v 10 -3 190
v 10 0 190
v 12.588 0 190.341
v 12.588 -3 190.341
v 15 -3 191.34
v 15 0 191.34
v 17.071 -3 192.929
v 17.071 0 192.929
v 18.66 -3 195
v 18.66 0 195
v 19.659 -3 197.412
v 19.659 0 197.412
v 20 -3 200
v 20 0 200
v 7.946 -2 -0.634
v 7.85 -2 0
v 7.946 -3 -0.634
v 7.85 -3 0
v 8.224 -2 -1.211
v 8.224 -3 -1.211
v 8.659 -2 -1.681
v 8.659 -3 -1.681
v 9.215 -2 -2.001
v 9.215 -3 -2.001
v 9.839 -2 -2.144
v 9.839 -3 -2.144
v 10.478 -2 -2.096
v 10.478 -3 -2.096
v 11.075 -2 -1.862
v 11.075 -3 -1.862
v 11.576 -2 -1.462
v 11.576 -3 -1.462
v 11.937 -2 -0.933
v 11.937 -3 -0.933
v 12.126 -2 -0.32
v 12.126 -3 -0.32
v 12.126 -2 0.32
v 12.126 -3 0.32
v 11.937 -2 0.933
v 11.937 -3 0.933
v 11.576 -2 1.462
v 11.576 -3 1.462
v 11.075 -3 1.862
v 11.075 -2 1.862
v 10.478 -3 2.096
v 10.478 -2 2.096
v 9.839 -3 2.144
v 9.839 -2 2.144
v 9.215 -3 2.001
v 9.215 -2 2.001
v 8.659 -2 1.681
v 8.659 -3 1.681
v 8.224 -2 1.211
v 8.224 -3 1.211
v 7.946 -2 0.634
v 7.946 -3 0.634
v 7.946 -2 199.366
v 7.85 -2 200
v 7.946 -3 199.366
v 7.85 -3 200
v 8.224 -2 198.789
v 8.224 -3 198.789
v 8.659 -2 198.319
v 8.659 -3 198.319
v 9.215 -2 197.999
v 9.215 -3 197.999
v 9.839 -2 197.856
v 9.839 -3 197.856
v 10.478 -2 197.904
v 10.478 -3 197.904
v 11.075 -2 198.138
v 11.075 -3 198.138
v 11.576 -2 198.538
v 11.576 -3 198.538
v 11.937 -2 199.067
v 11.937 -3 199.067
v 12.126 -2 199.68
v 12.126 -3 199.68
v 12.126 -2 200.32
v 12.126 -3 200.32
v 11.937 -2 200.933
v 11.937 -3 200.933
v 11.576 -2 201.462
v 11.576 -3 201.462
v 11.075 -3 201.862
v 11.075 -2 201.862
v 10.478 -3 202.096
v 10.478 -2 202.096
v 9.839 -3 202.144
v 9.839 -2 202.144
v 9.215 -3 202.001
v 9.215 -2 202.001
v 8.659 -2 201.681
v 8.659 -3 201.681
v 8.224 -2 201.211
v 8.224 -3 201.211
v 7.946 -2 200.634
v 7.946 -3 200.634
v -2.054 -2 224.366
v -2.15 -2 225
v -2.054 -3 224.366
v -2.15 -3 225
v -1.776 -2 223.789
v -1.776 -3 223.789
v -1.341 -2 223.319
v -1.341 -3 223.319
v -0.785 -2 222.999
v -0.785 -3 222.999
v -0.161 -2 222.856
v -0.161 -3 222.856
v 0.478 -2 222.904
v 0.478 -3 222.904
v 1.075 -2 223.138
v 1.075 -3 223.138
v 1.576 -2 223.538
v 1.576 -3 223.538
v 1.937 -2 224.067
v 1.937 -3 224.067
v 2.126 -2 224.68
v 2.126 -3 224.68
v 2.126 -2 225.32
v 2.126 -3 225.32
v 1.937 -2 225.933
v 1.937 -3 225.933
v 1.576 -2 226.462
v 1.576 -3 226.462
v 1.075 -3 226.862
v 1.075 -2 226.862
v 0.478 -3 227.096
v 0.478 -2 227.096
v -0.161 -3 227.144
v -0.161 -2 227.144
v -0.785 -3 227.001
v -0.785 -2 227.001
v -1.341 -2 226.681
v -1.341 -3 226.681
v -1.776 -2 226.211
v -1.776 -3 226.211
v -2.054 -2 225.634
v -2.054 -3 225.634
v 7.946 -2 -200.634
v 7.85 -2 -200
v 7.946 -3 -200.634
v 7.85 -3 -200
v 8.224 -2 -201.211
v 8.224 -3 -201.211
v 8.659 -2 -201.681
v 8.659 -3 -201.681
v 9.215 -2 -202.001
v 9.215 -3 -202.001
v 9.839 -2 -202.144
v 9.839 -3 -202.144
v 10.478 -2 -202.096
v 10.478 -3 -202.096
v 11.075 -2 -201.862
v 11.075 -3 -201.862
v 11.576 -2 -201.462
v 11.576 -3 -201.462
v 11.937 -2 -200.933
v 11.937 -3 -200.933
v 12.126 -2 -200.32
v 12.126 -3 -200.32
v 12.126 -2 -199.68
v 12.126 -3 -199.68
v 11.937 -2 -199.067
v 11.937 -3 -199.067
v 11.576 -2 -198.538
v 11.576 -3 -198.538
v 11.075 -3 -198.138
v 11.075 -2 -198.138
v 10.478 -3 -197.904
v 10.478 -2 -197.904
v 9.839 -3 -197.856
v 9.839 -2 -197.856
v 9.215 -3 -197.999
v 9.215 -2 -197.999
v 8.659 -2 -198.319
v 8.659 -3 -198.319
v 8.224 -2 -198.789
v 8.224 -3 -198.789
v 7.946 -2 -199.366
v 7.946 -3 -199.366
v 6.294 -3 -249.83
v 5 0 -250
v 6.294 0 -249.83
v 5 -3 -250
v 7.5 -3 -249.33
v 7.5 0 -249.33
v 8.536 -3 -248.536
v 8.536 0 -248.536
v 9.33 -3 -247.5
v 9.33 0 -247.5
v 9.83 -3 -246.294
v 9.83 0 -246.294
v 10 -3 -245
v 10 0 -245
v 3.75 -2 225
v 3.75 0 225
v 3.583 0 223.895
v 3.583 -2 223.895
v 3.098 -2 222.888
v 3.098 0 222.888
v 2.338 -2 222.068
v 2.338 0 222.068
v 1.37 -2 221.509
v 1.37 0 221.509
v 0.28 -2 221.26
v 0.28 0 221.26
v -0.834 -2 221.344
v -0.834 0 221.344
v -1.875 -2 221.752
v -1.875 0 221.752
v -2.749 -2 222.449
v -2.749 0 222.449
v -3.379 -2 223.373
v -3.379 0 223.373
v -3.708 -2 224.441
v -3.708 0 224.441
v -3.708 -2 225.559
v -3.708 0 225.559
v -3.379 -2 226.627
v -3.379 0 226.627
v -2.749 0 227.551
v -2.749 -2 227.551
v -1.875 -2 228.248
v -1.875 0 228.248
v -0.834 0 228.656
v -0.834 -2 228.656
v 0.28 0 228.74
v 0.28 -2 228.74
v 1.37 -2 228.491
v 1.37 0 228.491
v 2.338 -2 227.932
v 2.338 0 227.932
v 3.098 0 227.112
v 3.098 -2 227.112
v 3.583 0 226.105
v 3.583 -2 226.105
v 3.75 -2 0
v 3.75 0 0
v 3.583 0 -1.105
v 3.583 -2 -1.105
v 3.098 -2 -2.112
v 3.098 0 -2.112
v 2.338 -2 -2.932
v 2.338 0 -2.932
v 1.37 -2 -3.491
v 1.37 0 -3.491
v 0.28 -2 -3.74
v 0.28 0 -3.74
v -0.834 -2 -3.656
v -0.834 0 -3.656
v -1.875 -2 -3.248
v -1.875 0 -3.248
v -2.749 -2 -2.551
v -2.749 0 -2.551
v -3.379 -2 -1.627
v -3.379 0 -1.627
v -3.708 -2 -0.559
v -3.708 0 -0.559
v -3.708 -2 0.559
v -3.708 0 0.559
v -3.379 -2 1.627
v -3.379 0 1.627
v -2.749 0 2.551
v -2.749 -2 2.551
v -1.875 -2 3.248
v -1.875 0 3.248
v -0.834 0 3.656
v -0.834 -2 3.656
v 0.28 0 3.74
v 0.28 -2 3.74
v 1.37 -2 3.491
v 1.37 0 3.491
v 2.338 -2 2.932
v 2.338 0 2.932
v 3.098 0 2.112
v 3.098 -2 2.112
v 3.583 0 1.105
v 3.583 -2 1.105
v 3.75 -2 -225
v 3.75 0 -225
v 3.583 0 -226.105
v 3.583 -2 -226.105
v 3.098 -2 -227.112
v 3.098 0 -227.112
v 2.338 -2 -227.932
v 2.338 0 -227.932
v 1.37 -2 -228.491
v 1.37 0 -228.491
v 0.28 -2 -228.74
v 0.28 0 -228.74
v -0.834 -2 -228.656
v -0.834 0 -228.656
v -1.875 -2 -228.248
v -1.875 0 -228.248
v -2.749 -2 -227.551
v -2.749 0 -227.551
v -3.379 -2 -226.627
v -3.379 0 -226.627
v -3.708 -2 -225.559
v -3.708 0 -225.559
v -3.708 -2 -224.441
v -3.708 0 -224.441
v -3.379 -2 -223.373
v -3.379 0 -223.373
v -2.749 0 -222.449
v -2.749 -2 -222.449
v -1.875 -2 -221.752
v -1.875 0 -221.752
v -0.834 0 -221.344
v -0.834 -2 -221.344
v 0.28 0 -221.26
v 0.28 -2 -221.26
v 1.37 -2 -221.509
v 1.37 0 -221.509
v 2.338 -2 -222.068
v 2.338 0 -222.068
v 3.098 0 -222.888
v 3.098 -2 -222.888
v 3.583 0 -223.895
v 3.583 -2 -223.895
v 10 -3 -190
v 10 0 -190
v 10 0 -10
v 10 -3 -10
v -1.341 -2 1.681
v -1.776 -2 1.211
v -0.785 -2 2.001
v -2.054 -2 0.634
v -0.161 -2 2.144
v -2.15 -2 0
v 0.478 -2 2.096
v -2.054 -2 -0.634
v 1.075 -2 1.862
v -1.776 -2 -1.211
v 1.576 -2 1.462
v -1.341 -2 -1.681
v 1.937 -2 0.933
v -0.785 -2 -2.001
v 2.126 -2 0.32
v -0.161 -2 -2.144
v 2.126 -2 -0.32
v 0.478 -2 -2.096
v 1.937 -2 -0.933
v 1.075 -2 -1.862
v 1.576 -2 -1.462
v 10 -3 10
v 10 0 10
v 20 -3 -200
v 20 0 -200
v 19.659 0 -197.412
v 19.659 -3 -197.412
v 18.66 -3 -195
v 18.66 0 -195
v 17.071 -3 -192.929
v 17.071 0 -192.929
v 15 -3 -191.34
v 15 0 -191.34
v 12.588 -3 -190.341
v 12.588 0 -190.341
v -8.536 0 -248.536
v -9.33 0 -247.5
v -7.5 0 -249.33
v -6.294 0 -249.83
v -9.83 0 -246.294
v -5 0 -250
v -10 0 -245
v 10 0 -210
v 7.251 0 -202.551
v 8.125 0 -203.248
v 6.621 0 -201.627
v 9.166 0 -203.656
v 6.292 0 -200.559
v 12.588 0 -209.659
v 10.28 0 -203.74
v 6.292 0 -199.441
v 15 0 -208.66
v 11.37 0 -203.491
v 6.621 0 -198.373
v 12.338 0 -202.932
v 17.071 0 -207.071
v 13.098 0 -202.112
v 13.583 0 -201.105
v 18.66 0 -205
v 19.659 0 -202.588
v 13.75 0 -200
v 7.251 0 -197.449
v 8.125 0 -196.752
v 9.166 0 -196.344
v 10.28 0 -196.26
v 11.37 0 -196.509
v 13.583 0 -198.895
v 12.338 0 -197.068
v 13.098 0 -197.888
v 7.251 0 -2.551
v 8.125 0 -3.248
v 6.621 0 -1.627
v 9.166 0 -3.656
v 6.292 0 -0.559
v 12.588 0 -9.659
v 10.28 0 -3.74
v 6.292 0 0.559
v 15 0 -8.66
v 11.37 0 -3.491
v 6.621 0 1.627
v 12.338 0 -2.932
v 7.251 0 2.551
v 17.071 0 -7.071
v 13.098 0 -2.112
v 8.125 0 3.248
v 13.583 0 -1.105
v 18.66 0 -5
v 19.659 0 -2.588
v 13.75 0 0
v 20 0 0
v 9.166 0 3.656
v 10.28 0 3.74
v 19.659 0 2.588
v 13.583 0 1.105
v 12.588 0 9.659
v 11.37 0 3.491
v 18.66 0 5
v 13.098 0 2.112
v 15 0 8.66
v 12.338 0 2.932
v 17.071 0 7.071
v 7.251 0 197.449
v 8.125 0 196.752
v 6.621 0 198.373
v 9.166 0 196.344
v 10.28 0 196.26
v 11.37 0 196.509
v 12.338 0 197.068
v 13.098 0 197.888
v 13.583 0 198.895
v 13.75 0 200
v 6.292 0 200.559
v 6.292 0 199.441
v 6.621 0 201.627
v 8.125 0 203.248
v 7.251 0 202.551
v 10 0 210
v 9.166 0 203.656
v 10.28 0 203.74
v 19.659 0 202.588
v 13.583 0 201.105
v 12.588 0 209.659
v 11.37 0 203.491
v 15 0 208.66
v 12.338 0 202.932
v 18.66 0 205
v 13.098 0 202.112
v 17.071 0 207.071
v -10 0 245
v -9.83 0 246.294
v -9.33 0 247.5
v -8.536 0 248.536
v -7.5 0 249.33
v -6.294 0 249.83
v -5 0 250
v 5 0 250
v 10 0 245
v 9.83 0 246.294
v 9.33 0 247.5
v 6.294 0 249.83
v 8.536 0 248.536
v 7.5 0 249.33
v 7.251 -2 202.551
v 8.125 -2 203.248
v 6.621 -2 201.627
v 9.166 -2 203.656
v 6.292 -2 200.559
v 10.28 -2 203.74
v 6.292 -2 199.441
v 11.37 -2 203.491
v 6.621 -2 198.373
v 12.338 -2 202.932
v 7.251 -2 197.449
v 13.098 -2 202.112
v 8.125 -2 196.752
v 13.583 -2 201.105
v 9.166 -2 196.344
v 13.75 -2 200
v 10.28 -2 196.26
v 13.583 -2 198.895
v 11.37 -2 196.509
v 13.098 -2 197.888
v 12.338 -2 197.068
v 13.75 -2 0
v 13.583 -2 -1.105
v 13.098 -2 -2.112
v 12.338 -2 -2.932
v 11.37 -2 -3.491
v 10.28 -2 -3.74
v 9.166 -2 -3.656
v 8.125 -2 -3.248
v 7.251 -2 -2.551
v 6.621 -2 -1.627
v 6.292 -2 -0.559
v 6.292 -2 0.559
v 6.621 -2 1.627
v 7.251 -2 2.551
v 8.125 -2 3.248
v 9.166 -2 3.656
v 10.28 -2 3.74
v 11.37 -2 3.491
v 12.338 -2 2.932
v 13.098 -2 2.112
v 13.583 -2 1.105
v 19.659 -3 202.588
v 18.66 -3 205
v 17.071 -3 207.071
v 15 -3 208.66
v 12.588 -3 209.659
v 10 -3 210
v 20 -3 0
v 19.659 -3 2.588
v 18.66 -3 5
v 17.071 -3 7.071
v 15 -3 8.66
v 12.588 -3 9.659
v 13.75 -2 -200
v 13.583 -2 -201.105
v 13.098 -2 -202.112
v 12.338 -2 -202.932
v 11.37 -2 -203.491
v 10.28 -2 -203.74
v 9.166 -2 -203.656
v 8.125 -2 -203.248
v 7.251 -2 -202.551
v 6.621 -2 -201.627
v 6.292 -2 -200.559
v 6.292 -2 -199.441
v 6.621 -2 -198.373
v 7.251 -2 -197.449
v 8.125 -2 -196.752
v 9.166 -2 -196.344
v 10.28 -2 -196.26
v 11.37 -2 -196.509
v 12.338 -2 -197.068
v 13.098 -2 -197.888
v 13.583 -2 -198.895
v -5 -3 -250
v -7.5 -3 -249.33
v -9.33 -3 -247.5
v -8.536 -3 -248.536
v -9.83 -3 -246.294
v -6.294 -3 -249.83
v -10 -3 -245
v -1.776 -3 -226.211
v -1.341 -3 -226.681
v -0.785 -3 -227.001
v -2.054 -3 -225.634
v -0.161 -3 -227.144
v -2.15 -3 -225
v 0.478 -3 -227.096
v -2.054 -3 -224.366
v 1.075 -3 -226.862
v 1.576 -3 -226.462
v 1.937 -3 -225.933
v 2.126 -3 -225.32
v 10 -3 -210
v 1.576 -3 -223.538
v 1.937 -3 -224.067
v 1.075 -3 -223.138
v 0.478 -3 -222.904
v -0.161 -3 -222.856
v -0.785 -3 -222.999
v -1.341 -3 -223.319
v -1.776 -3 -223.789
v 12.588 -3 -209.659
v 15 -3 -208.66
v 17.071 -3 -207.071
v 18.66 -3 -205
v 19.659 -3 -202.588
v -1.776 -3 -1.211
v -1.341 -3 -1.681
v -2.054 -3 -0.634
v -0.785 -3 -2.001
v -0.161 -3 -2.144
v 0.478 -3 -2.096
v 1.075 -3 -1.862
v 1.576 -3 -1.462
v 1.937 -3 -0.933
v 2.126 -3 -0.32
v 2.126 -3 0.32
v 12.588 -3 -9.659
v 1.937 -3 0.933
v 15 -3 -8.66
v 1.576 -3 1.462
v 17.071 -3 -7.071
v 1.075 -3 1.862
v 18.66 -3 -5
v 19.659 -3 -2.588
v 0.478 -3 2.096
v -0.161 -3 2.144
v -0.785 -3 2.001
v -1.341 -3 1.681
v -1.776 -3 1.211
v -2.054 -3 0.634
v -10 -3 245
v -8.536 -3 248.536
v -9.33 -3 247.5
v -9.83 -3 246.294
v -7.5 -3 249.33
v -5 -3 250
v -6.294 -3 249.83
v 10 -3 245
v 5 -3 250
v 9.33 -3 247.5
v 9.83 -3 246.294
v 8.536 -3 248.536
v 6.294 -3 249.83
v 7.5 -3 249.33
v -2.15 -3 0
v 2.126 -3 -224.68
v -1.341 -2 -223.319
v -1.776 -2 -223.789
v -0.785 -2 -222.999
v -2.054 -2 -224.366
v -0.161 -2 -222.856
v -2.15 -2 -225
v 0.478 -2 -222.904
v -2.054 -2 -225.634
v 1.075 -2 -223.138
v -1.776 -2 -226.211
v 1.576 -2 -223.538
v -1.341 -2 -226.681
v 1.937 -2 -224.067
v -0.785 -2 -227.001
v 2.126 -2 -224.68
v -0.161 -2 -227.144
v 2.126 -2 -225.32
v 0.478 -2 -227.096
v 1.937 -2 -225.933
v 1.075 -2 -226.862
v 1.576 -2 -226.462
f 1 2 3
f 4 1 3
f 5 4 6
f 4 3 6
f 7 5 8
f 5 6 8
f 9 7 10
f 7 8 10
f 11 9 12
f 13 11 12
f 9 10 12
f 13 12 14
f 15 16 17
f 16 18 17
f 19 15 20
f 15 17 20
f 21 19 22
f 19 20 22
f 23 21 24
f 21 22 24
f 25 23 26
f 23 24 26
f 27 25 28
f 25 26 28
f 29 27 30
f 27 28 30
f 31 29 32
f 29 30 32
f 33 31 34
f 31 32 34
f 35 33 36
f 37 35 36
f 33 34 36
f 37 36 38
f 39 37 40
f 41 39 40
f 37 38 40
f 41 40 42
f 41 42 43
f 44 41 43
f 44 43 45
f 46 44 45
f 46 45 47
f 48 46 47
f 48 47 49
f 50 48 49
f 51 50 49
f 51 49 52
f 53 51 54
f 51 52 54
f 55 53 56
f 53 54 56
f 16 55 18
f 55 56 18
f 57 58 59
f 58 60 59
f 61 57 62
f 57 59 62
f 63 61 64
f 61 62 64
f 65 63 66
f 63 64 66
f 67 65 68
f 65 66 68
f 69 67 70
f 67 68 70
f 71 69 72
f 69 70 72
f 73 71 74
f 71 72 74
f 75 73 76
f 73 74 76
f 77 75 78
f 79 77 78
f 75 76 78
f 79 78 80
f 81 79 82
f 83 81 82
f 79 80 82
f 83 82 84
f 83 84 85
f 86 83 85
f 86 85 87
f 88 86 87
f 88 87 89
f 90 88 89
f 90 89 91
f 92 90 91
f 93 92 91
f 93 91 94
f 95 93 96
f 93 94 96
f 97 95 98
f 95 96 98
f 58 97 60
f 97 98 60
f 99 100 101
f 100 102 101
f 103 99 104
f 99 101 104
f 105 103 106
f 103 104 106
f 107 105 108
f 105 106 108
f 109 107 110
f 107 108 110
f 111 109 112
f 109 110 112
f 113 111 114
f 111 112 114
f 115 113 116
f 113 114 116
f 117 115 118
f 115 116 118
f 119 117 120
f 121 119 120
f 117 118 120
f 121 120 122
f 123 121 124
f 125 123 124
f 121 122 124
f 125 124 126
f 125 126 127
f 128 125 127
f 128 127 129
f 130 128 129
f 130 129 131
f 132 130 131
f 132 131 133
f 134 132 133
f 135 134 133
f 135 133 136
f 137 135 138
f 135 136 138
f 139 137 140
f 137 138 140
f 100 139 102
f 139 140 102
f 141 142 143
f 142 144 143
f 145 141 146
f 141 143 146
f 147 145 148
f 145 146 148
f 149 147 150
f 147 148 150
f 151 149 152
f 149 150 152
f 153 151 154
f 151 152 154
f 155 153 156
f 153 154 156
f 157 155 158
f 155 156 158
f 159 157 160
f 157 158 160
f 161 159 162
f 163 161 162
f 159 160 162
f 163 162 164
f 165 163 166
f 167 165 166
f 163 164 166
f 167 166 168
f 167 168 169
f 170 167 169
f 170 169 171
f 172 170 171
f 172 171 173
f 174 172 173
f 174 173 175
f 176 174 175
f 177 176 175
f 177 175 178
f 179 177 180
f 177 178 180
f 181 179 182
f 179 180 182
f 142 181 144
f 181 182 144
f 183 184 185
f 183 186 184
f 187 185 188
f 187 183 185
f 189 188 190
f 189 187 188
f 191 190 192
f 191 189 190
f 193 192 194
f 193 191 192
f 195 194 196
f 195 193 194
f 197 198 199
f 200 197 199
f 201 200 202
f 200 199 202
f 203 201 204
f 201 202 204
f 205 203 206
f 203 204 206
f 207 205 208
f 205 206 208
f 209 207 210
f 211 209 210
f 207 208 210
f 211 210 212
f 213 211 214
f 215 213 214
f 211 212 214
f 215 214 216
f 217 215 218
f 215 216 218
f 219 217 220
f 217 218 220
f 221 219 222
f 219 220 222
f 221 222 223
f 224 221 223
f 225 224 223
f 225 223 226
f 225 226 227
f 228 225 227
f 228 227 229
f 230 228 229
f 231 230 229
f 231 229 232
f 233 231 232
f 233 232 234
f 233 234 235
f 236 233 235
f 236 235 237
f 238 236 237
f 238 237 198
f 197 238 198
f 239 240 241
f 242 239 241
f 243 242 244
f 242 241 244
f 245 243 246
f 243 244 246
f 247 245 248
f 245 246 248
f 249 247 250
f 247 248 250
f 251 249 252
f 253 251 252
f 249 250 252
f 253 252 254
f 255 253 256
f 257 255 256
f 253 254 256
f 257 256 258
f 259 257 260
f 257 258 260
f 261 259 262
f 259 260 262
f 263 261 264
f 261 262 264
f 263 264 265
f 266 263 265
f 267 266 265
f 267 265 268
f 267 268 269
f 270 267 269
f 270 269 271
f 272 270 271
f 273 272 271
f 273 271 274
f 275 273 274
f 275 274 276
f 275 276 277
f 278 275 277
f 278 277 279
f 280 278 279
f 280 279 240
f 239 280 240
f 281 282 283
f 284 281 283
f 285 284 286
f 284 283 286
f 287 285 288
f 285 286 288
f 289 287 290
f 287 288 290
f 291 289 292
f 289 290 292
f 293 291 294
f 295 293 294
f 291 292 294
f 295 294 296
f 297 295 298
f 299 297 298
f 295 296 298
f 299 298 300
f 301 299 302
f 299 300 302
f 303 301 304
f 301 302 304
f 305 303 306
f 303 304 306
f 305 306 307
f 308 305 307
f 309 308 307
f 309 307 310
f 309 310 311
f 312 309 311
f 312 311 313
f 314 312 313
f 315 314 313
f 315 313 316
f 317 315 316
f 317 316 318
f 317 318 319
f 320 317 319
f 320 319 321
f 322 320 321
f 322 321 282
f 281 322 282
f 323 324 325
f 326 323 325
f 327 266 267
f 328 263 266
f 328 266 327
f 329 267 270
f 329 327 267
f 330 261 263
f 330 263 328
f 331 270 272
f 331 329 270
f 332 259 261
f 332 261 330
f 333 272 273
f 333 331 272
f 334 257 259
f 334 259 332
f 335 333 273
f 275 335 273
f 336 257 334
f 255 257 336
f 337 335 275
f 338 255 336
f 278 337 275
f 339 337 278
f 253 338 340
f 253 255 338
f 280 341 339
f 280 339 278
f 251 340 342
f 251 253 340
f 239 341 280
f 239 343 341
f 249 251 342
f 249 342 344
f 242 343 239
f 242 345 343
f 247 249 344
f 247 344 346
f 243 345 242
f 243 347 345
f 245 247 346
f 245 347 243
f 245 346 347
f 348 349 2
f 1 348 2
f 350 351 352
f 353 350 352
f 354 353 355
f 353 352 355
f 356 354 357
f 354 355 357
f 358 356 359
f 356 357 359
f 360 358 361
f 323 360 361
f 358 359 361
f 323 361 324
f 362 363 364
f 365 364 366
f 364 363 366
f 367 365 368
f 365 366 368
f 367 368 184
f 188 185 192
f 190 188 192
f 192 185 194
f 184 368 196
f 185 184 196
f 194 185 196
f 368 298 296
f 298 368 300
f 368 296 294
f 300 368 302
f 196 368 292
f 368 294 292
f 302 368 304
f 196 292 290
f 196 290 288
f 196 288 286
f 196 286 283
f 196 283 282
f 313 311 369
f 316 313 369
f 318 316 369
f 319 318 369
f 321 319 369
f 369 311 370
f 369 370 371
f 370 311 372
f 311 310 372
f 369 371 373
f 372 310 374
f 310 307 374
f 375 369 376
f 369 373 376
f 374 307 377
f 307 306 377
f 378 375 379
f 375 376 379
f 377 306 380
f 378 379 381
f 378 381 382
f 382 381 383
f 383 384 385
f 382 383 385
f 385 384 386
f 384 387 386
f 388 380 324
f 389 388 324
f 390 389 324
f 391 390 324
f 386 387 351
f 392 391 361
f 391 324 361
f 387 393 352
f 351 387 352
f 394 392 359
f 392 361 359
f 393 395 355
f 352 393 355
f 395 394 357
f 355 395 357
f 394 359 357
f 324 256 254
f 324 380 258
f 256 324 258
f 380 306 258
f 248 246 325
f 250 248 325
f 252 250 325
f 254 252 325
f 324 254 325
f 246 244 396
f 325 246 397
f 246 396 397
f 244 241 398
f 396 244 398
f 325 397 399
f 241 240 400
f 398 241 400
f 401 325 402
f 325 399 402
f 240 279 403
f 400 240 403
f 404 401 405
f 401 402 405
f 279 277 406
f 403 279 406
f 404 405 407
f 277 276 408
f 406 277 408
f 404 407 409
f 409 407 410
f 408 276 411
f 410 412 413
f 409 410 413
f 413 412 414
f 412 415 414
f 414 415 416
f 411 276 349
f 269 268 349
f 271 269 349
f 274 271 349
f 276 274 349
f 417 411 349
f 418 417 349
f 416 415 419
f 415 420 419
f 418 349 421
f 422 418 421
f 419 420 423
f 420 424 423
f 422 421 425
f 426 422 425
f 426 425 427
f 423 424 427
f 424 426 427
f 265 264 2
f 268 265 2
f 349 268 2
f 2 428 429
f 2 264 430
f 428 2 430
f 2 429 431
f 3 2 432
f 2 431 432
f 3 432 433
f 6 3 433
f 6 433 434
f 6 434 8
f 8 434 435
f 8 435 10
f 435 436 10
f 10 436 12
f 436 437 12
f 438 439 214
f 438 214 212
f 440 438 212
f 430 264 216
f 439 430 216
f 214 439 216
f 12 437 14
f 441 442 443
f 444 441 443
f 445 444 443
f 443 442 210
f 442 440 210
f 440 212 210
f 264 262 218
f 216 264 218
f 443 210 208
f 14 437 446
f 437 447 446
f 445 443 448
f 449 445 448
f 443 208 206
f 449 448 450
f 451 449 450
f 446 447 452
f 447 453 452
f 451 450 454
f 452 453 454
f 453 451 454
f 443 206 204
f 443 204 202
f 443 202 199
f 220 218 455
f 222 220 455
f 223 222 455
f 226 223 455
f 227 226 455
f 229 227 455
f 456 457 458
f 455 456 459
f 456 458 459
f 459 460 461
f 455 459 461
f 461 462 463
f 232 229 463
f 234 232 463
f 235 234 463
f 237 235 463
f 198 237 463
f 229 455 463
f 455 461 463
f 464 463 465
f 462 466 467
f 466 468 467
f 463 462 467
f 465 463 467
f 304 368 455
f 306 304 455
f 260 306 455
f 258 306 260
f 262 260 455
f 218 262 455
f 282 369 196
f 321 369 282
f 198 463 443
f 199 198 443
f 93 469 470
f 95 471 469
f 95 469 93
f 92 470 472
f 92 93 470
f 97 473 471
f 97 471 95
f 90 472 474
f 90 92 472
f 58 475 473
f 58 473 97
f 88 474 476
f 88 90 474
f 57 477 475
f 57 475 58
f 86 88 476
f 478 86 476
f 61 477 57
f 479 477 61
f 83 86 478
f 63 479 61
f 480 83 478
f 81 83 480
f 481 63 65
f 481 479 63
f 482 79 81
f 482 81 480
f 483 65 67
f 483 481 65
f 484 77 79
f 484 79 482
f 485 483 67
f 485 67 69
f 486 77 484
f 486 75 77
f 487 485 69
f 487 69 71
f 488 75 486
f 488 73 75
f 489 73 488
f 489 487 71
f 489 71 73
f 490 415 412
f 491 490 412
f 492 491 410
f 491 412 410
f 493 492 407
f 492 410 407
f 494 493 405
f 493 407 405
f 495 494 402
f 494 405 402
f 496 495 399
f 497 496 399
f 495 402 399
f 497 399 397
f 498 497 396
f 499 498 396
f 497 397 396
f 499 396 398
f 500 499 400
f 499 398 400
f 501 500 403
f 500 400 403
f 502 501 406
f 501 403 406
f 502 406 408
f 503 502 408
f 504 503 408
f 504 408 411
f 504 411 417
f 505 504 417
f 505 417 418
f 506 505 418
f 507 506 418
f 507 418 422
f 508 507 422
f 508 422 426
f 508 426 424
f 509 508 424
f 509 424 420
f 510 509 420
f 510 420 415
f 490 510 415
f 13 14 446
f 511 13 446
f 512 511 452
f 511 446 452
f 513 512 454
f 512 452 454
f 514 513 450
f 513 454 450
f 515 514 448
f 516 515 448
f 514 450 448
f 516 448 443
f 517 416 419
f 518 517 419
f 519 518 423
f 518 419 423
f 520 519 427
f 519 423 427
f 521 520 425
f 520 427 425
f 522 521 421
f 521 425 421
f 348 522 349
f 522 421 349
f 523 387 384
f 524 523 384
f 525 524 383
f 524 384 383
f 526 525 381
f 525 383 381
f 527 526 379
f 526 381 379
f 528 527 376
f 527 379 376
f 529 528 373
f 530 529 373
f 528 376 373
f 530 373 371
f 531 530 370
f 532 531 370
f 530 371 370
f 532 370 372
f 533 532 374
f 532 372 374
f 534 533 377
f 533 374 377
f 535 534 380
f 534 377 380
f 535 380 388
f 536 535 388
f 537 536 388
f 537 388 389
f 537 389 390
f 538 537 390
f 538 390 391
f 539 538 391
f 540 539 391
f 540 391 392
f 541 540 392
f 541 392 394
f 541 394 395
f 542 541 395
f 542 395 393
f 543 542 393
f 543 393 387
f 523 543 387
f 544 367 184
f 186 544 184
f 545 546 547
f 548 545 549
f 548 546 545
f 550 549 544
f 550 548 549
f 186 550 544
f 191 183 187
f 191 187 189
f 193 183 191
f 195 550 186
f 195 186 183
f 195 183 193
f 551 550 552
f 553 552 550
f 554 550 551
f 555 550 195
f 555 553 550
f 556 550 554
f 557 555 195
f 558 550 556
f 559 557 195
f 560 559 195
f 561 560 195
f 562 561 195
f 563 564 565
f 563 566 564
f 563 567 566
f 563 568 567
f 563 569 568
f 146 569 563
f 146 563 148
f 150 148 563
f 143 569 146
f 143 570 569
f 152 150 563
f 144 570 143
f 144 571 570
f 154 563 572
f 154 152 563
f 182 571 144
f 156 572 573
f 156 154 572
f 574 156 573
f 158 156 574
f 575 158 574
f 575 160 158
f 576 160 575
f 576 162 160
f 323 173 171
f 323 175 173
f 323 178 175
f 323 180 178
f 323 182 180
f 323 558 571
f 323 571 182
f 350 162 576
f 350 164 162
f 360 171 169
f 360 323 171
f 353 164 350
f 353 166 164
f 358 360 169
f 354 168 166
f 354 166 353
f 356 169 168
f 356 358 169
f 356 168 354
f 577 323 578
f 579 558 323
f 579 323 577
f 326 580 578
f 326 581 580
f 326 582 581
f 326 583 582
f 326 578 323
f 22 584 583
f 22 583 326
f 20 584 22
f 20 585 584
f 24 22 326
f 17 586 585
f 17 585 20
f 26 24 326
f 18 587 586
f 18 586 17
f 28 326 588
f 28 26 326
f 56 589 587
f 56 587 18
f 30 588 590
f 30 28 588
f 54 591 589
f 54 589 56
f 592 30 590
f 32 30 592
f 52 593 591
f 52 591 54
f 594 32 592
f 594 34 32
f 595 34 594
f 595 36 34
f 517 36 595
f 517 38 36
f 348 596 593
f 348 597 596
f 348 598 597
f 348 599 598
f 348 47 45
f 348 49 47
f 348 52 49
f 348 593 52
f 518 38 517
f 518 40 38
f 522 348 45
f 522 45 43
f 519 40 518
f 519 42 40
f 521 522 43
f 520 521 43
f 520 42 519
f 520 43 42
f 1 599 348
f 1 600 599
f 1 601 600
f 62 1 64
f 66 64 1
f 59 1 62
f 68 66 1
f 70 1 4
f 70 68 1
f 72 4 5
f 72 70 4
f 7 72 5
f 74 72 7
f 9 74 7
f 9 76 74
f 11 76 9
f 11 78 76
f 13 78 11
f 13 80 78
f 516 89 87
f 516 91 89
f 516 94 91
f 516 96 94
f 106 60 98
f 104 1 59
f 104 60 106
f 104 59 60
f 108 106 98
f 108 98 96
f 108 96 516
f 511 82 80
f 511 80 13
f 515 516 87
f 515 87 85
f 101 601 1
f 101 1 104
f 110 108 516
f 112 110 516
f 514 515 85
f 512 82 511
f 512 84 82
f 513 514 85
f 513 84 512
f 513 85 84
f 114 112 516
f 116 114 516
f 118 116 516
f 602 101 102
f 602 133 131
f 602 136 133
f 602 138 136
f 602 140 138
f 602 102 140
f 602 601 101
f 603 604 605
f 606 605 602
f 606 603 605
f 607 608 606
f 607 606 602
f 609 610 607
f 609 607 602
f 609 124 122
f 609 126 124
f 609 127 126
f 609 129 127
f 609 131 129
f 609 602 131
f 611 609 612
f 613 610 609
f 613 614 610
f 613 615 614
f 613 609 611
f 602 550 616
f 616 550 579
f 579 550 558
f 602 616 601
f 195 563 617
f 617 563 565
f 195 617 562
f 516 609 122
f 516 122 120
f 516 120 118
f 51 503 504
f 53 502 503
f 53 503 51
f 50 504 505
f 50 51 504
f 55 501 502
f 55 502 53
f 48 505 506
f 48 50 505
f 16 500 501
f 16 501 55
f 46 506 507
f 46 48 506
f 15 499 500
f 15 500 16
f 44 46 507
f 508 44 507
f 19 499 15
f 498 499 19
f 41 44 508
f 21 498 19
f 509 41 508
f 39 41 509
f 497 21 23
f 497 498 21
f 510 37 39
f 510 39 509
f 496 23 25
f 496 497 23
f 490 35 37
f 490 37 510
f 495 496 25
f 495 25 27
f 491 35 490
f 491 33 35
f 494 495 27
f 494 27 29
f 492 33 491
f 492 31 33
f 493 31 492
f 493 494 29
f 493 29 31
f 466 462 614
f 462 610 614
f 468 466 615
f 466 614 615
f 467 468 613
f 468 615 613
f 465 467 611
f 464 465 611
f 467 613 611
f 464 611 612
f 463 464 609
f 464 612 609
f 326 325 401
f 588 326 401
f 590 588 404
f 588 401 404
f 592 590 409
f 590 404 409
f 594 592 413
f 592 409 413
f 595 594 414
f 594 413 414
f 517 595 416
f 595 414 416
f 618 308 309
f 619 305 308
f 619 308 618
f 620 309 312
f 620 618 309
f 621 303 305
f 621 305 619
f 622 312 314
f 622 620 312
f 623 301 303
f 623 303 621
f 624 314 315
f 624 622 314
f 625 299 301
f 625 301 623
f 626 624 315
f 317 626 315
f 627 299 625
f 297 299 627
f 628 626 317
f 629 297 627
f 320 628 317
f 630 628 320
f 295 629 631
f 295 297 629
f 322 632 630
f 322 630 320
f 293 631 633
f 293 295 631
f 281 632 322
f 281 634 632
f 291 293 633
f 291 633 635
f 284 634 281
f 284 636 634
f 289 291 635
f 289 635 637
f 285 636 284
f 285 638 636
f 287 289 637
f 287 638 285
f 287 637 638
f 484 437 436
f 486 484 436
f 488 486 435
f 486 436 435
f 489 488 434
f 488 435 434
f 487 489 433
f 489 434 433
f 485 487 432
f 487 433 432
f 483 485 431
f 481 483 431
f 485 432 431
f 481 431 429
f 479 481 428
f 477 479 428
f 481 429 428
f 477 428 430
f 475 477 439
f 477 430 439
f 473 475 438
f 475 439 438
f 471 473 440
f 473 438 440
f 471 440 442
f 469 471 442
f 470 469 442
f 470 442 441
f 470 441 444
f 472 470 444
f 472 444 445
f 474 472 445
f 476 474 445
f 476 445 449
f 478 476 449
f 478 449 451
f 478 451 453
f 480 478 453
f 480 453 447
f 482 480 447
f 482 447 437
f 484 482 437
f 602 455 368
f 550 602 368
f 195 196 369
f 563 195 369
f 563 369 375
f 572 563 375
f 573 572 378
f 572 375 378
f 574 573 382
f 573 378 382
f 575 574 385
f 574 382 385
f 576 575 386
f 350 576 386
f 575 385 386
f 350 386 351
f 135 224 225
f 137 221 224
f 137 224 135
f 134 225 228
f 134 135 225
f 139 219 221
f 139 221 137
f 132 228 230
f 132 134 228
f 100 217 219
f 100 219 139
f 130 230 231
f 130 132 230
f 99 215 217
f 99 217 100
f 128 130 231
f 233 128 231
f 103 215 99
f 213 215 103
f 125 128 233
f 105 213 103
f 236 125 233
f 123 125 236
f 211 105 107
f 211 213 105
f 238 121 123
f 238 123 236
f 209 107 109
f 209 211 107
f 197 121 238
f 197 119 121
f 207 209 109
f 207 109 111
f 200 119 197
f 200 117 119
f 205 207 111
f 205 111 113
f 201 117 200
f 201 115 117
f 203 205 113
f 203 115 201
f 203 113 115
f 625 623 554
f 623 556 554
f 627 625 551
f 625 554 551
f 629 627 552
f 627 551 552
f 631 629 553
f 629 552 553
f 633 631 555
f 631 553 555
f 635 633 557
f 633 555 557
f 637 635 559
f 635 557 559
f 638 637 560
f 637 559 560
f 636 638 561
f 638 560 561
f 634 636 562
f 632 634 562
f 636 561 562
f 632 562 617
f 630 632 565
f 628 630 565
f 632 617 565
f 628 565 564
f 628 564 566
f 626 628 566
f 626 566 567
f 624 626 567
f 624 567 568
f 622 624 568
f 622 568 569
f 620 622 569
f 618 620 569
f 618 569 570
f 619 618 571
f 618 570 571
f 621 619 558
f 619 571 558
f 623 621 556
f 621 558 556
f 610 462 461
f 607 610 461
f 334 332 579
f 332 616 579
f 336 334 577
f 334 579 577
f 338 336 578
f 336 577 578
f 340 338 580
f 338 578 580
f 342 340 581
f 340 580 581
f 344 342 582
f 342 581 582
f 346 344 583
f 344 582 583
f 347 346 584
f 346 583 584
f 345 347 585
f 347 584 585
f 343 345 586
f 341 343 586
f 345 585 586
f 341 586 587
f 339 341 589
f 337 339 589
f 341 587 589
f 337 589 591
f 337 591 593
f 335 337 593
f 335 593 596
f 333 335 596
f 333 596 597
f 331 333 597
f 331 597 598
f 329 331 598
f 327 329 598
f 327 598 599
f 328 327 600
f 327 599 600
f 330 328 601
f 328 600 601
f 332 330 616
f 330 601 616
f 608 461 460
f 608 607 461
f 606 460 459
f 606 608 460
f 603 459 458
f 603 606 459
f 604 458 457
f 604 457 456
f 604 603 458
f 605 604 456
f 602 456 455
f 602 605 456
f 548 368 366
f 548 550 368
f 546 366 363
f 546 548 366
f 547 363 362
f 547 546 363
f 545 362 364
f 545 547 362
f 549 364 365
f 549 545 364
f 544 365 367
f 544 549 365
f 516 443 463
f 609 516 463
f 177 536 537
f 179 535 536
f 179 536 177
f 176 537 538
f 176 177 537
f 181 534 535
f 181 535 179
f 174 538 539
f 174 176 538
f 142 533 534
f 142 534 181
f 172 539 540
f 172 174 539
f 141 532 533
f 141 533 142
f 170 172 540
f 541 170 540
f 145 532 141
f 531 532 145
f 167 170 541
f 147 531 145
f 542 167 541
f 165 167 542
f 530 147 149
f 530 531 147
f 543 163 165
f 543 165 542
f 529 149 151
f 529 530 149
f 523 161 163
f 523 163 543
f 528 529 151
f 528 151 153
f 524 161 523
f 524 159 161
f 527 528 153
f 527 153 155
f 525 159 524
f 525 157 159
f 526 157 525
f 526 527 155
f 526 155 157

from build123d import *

# Parameters (mm, degrees)
F1_DEPTH       = 3
F2_D           = 4.3
F2_CBORE_D     = 7.5
F2_CBORE_DEPTH = 2
F3_D           = 4.3
F3_CBORE_D     = 7.5
F3_CBORE_DEPTH = 2
F4_R           = 5


with BuildPart() as f1:
    # F0 (on Front) → F1 (new body)
    with BuildSketch(Plane.XZ):
        with BuildLine():
            Line((10, 250), (-10, 250))
            Line((-10, 250), (-10, -250))
            Line((-10, -250), (10, -250))
            Line((10, -250), (10, -210))
            ThreePointArc((10, -210), (0, -200), (10, -190))
            Line((10, -190), (10, -10))
            ThreePointArc((10, -10), (0, 0), (10, 10))
            Line((10, 10), (10, 190))
            ThreePointArc((10, 190), (0, 200), (10, 210))
            Line((10, 210), (10, 250))
        make_face()
        with BuildLine():
            ThreePointArc((20, 200), (17.0710678119, 207.0710678119), (10, 210))
            Line((10, 210), (10, 190))
            ThreePointArc((10, 190), (17.0710678119, 192.9289321881), (20, 200))
        make_face()
        with BuildLine():
            Line((10, 190), (10, 210))
            ThreePointArc((10, 210), (0, 200), (10, 190))
        make_face()
        with BuildLine():
            ThreePointArc((10, -190), (0, -200), (10, -210))
            Line((10, -210), (10, -190))
        make_face()
        with BuildLine():
            Line((10, -190), (10, -210))
            ThreePointArc((10, -210), (17.0710678119, -207.0710678119), (20, -200))
            ThreePointArc((20, -200), (17.0710678119, -192.9289321881), (10, -190))
        make_face()
        with BuildLine():
            ThreePointArc((20, 0), (17.0710678119, 7.0710678119), (10, 10))
            Line((10, 10), (10, -10))
            ThreePointArc((10, -10), (17.0710678119, -7.0710678119), (20, 0))
        make_face()
        with BuildLine():
            Line((10, -10), (10, 10))
            ThreePointArc((10, 10), (0, 0), (10, -10))
        make_face()
    extrude(amount=F1_DEPTH)

    # F2 (through all)
    with Locations(Plane(origin=(0, 0, 0), x_dir=(1, 0, 0), z_dir=(0, 1, 0))):
        with Locations((0, 0), (0, -225), (0, 225)):
            CounterBoreHole(F2_D / 2, F2_CBORE_D / 2, F2_CBORE_DEPTH)

    # F3 (through all)
    with Locations(Plane(origin=(0, 0, 0), x_dir=(1, 0, 0), z_dir=(0, 1, 0))):
        with Locations((10, 0), (10, -200), (10, 200)):
            CounterBoreHole(F3_D / 2, F3_CBORE_D / 2, F3_CBORE_DEPTH)

    # F4
    f4_edges = [f1.edges().sort_by_distance(p)[0] for p in [
        (-10, -1.5, 250),
        (10, -1.5, 250),
        (-10, -1.5, -250),
        (10, -1.5, -250),
    ]]
    fillet(f4_edges, radius=F4_R)


solid = f1.part
